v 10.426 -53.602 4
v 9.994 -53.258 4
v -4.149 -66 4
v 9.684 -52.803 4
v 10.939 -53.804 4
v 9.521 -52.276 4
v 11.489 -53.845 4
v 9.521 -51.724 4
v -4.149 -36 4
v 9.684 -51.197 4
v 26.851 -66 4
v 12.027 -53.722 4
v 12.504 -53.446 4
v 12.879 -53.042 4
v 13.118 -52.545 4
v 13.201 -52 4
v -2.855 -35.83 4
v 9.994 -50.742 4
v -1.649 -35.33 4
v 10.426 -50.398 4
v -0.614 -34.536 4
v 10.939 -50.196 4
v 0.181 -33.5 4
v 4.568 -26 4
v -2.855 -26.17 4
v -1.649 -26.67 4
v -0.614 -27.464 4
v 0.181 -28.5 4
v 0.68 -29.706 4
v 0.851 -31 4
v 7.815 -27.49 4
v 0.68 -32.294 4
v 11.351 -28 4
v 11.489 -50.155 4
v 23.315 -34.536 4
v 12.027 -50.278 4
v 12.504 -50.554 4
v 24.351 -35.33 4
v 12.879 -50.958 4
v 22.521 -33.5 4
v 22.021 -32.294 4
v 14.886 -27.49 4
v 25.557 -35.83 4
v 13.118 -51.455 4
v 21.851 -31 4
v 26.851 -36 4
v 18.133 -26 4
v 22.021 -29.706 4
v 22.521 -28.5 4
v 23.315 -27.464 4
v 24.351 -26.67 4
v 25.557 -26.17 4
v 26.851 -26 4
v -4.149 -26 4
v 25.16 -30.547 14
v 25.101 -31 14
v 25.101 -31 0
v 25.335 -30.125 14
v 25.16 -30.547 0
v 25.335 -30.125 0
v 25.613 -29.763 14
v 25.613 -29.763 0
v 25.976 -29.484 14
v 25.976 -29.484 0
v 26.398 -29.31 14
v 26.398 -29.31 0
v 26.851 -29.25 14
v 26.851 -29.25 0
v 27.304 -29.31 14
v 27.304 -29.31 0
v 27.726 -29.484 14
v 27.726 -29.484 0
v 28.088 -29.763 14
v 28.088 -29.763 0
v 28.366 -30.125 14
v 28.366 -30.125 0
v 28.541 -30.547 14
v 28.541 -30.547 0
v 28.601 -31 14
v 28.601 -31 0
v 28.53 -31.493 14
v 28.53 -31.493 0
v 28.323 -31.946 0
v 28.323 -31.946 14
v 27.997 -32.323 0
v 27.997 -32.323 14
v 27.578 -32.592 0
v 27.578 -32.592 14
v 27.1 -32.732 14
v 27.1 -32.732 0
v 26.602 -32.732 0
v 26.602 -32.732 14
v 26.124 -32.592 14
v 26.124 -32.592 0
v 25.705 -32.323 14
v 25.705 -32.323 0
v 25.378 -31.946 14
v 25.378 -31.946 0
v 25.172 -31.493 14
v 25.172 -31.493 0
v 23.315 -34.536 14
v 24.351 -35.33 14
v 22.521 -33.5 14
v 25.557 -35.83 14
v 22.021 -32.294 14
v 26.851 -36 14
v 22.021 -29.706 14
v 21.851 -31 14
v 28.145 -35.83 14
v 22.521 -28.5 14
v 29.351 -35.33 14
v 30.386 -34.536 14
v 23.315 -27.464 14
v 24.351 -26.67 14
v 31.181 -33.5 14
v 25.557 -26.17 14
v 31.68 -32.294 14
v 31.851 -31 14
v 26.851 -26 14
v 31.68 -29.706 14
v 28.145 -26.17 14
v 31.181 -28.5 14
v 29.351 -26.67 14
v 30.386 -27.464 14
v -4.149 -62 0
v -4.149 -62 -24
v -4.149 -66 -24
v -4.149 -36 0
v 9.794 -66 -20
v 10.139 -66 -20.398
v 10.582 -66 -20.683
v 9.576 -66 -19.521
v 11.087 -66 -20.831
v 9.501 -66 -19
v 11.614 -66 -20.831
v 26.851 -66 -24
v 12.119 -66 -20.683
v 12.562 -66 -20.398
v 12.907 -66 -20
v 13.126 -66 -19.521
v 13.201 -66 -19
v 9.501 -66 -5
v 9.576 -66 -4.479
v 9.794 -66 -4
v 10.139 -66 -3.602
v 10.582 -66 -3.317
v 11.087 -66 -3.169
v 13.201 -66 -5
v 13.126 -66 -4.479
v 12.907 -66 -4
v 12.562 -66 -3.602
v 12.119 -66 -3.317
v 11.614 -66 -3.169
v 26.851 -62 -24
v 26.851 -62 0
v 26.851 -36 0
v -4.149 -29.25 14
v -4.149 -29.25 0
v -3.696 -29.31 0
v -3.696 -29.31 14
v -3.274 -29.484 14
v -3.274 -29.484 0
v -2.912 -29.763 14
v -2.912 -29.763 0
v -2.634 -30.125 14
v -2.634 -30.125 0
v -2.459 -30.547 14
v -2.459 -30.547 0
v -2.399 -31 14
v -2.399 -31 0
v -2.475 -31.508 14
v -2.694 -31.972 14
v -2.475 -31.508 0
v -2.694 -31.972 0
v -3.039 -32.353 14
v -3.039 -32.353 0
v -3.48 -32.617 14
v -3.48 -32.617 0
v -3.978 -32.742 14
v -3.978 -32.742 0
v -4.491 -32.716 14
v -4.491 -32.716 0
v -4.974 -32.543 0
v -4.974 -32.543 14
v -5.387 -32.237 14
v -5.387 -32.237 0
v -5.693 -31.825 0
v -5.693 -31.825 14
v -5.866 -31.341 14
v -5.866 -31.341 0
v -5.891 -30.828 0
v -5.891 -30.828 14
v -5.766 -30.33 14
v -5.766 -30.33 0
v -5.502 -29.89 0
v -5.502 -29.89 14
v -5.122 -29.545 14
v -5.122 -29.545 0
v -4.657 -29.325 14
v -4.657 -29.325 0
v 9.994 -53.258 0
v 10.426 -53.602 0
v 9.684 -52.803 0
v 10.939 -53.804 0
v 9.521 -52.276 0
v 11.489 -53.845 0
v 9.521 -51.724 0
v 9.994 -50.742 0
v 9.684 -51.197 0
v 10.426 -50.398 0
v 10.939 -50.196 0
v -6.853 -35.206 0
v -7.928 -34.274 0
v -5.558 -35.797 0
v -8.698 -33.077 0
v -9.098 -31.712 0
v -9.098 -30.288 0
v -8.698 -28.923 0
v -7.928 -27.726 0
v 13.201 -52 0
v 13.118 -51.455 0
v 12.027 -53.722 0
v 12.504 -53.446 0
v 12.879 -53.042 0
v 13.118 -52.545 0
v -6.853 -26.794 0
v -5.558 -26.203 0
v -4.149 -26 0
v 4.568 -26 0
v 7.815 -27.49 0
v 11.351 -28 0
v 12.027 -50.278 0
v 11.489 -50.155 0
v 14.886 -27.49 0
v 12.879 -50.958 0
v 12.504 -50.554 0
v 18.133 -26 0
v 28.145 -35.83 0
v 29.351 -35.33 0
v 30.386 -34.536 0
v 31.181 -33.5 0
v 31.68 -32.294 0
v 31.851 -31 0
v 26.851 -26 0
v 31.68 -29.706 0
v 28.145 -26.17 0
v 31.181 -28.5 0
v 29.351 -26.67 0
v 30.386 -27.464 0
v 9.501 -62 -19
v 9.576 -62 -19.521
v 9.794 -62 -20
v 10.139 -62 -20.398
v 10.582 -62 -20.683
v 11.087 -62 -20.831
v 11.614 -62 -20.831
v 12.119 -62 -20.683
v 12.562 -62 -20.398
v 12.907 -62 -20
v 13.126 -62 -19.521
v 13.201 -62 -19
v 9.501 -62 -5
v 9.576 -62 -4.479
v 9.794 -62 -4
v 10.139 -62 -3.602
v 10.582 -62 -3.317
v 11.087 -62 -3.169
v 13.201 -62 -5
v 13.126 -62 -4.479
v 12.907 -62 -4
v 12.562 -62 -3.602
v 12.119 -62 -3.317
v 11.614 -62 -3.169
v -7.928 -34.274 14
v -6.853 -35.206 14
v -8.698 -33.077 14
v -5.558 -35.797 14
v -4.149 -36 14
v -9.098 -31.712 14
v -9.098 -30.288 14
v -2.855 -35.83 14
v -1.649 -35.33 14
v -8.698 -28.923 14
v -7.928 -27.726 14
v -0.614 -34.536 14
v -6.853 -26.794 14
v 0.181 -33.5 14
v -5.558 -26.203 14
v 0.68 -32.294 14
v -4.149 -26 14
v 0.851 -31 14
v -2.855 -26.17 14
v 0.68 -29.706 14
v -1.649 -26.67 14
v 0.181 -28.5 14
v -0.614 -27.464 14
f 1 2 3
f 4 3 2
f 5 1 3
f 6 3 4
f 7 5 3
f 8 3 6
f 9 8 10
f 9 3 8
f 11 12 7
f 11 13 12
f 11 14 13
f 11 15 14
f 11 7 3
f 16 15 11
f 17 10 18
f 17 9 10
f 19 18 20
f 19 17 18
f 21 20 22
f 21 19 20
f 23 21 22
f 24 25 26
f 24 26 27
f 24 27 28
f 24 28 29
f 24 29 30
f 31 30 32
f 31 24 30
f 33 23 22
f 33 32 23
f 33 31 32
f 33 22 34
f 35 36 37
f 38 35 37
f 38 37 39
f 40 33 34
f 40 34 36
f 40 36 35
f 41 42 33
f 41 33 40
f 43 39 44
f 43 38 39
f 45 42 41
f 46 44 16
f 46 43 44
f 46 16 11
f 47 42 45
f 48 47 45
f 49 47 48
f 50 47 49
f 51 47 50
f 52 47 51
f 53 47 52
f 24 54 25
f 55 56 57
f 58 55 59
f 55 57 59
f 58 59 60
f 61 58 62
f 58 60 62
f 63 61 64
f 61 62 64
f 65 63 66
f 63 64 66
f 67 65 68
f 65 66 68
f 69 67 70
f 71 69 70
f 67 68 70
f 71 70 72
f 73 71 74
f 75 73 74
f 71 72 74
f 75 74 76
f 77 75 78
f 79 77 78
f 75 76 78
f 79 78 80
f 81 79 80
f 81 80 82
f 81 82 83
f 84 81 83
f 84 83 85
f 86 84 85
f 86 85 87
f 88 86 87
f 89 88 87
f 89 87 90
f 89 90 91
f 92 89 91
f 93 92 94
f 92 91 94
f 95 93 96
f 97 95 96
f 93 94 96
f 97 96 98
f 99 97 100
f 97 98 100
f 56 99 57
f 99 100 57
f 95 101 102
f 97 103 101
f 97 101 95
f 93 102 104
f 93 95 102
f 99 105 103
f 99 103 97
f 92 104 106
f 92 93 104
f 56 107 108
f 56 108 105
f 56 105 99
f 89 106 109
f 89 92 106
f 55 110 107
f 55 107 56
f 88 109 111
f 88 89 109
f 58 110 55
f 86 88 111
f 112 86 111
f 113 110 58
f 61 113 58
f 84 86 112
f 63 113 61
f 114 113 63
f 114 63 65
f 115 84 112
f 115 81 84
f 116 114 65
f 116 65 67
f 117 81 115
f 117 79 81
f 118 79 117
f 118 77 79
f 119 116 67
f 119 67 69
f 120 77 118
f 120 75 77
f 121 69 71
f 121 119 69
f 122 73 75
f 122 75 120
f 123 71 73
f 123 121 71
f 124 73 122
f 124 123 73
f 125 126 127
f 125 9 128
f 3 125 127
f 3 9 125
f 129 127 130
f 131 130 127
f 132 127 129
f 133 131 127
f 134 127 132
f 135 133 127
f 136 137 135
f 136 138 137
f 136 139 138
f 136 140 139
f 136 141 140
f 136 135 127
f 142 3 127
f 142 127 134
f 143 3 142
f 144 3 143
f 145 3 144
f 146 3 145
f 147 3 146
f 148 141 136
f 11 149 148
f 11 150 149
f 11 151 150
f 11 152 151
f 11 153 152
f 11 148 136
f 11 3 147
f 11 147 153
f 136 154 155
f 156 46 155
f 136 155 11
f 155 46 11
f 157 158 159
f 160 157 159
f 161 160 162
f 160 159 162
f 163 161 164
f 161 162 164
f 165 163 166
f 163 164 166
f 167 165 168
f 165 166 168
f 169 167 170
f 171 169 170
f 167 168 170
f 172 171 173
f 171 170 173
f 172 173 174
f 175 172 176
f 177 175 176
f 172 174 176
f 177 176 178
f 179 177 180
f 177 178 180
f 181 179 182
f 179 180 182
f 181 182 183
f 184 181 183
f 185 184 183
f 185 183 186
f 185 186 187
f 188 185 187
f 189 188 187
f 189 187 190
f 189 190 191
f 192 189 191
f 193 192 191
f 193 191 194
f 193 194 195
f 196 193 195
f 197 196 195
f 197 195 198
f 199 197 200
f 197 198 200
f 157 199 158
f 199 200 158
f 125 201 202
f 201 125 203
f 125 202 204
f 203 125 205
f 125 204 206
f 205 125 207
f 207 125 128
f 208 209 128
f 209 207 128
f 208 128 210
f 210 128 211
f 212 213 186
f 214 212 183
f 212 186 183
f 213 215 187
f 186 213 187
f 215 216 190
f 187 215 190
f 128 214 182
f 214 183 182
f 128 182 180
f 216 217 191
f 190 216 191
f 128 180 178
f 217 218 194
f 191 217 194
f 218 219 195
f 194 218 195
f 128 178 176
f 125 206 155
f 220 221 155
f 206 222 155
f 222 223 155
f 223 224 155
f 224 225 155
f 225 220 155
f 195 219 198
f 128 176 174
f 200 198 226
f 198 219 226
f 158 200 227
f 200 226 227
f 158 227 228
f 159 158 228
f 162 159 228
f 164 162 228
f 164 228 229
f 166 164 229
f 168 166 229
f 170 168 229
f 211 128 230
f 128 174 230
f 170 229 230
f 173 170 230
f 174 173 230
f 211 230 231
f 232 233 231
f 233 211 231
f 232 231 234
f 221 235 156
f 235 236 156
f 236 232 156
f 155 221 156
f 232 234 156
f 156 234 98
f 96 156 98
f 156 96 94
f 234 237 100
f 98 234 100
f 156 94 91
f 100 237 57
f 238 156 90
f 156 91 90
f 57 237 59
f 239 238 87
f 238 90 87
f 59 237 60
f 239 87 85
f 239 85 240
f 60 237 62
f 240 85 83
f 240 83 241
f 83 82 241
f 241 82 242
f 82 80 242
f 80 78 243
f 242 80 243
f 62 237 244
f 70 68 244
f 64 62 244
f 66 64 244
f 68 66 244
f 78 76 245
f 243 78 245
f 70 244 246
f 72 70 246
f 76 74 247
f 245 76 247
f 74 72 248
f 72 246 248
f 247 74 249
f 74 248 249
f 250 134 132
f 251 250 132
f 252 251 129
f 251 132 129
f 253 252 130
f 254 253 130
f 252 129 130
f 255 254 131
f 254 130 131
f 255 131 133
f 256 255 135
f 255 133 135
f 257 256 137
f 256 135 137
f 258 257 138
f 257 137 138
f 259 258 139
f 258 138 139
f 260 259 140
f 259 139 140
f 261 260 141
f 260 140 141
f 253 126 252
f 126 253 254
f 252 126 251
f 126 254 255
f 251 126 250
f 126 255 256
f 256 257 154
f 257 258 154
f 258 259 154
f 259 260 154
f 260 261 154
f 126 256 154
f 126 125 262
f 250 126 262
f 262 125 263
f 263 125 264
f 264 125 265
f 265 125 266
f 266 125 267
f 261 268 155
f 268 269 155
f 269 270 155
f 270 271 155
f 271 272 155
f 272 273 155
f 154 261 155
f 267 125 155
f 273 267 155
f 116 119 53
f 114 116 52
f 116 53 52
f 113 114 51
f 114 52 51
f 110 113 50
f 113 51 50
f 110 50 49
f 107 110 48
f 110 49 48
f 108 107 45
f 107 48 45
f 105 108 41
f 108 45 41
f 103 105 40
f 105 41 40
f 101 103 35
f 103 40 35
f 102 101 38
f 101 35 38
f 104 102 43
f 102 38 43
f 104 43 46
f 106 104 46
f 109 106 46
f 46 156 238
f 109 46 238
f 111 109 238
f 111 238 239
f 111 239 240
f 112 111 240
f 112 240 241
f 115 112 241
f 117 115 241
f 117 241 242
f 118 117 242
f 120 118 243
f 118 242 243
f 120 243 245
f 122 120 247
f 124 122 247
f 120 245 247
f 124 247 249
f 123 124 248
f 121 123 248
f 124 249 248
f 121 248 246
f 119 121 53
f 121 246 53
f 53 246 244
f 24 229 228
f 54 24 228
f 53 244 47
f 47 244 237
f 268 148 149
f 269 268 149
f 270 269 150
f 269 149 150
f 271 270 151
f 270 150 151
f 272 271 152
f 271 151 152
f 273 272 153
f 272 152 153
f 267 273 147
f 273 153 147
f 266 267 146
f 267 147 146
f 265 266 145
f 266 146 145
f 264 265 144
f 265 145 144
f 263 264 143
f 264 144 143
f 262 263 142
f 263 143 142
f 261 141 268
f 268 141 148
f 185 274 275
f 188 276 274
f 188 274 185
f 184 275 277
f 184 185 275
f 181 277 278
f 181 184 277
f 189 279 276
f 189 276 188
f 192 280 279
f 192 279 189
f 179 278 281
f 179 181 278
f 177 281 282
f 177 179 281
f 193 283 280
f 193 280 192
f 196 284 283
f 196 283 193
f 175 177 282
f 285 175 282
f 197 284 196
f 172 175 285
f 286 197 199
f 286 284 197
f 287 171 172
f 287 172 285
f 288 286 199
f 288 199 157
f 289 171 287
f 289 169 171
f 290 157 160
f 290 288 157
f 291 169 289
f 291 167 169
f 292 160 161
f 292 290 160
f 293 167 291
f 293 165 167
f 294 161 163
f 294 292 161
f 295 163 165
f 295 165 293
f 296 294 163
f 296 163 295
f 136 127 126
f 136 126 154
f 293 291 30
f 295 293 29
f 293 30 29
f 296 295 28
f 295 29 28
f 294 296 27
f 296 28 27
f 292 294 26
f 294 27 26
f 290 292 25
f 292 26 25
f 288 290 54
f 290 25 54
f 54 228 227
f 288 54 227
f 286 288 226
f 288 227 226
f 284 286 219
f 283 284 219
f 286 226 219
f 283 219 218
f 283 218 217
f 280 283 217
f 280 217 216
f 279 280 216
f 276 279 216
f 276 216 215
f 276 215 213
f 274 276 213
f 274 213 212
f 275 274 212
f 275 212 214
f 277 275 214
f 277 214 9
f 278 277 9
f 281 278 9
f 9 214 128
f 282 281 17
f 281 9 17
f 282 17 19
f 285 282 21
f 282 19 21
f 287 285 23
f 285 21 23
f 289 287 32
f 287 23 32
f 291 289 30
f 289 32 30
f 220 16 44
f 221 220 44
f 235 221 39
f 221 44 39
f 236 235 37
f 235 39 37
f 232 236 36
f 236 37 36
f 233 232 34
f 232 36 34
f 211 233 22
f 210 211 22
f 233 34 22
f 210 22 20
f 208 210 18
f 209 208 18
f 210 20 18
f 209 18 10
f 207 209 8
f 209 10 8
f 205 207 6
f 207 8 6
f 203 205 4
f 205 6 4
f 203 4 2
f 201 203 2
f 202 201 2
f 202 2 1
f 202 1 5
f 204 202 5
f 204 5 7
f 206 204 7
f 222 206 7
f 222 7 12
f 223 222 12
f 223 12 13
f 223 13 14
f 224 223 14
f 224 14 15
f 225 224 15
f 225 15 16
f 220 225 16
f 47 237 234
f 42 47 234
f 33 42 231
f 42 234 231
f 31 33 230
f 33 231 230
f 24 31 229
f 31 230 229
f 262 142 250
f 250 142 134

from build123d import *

# Parameters (mm, degrees)
F1_DEPTH = 4
F2_DEPTH = 14
F3_DEPTH = 30
F4_W     = 31
F4_H     = 4
F5_DEPTH = 24
F8_DEPTH = 25
F7_R     = 1.85
F9_DEPTH = 25


with BuildPart() as f1:
    # F0 (on Top) → F1 (new body)
    with BuildSketch(Plane.XY):
        with BuildLine():
            ThreePointArc((-4.1493639073, -29.25), (-2.9119270402, -29.7625631329), (-2.3993639073, -31))
            Line((-2.3993639073, -31), (0.8506360927, -31))
            ThreePointArc((0.8506360927, -31), (-0.6138300013, -27.4644660941), (-4.1493639073, -26))
            Line((-4.1493639073, -26), (-4.1493639073, -29.25))
        make_face()
        with BuildLine():
            Line((0.8506360927, -31), (-2.3993639073, -31))
            ThreePointArc((-2.3993639073, -31), (-5.3868007743, -32.2374368671), (-4.1493639073, -29.25))
            Line((-4.1493639073, -29.25), (-4.1493639073, -26))
            ThreePointArc((-4.1493639073, -26), (-9.1493639073, -31), (-4.1493639073, -36))
            ThreePointArc((-4.1493639073, -36), (-0.6138300013, -34.5355339059), (0.8506360927, -31))
        make_face()
        with BuildLine():
            ThreePointArc((-4.1493639073, -26), (-0.6138300013, -27.4644660941), (0.8506360927, -31))
            Line((0.8506360927, -31), (21.8506360927, -31))
            ThreePointArc((21.8506360927, -31), (23.3151021868, -27.4644660941), (26.8506360927, -26))
            Line((26.8506360927, -26), (18.1329660759, -26))
            ThreePointArc((18.1329660759, -26), (11.3506360927, -28), (4.5683061096, -26))
            Line((4.5683061096, -26), (-4.1493639073, -26))
        make_face()
        with BuildLine():
            ThreePointArc((26.8506360927, -26), (23.3151021868, -27.4644660941), (21.8506360927, -31))
            Line((21.8506360927, -31), (25.1006360927, -31))
            ThreePointArc((25.1006360927, -31), (25.6131992257, -29.7625631329), (26.8506360927, -29.25))
            Line((26.8506360927, -29.25), (26.8506360927, -26))
        make_face()
        with BuildLine():
            Line((25.1006360927, -31), (21.8506360927, -31))
            ThreePointArc((21.8506360927, -31), (23.3151021868, -34.5355339059), (26.8506360927, -36))
            ThreePointArc((26.8506360927, -36), (30.3861699987, -34.5355339059), (31.8506360927, -31))
            ThreePointArc((31.8506360927, -31), (30.3861699987, -27.4644660941), (26.8506360927, -26))
            Line((26.8506360927, -26), (26.8506360927, -29.25))
            ThreePointArc((26.8506360927, -29.25), (28.0880729598, -29.7625631329), (28.6006360927, -31))
            ThreePointArc((28.6006360927, -31), (26.8506360927, -32.75), (25.1006360927, -31))
        make_face()
        with BuildLine():
            Line((21.8506360927, -31), (0.8506360927, -31))
            ThreePointArc((0.8506360927, -31), (-0.6138300013, -34.5355339059), (-4.1493639073, -36))
            Line((-4.1493639073, -36), (26.8506360927, -36))
            ThreePointArc((26.8506360927, -36), (23.3151021868, -34.5355339059), (21.8506360927, -31))
        make_face()
    extrude(amount=F1_DEPTH)

    # F0 (on Top) → F2 (join)
    with BuildSketch(Plane.XY):
        with BuildLine():
            ThreePointArc((-4.1493639073, -29.25), (-2.9119270402, -29.7625631329), (-2.3993639073, -31))
            Line((-2.3993639073, -31), (0.8506360927, -31))
            ThreePointArc((0.8506360927, -31), (-0.6138300013, -27.4644660941), (-4.1493639073, -26))
            Line((-4.1493639073, -26), (-4.1493639073, -29.25))
        make_face()
        with BuildLine():
            Line((0.8506360927, -31), (-2.3993639073, -31))
            ThreePointArc((-2.3993639073, -31), (-5.3868007743, -32.2374368671), (-4.1493639073, -29.25))
            Line((-4.1493639073, -29.25), (-4.1493639073, -26))
            ThreePointArc((-4.1493639073, -26), (-9.1493639073, -31), (-4.1493639073, -36))
            ThreePointArc((-4.1493639073, -36), (-0.6138300013, -34.5355339059), (0.8506360927, -31))
        make_face()
        with BuildLine():
            ThreePointArc((26.8506360927, -26), (23.3151021868, -27.4644660941), (21.8506360927, -31))
            Line((21.8506360927, -31), (25.1006360927, -31))
            ThreePointArc((25.1006360927, -31), (25.6131992257, -29.7625631329), (26.8506360927, -29.25))
            Line((26.8506360927, -29.25), (26.8506360927, -26))
        make_face()
        with BuildLine():
            Line((25.1006360927, -31), (21.8506360927, -31))
            ThreePointArc((21.8506360927, -31), (23.3151021868, -34.5355339059), (26.8506360927, -36))
            ThreePointArc((26.8506360927, -36), (30.3861699987, -34.5355339059), (31.8506360927, -31))
            ThreePointArc((31.8506360927, -31), (30.3861699987, -27.4644660941), (26.8506360927, -26))
            Line((26.8506360927, -26), (26.8506360927, -29.25))
            ThreePointArc((26.8506360927, -29.25), (28.0880729598, -29.7625631329), (28.6006360927, -31))
            ThreePointArc((28.6006360927, -31), (26.8506360927, -32.75), (25.1006360927, -31))
        make_face()
    extrude(amount=F2_DEPTH)

    # F3 (add): a face of the model
    f3_faces = [f1.faces().sort_by_distance(p)[0] for p in [
        (11.3506360927, -36, 2),
    ]]
    extrude(f3_faces, amount=F3_DEPTH)

    # F4 (on face) → F5 (join)
    with BuildSketch(Plane(origin=(0, 0, 0), x_dir=(1, 0, 0), z_dir=(0, 0, -1))):
        with Locations((11.3506360927, 64)):
            Rectangle(F4_W, F4_H)
    extrude(amount=F5_DEPTH)

    # F6 (on face) → F8 (cut)
    with BuildSketch(Plane.XZ.offset(66)):
        with BuildLine():
            Line((13.2006360927, -19), (13.2006360927, -12))
            Line((13.2006360927, -12), (13.2006360927, -5))
            ThreePointArc((13.2006360927, -5), (11.3506360927, -3.15), (9.5006360927, -5))
            Line((9.5006360927, -5), (9.5006360927, -12))
            Line((9.5006360927, -12), (9.5006360927, -19))
            ThreePointArc((9.5006360927, -19), (11.3506360927, -20.85), (13.2006360927, -19))
        make_face()
    extrude(amount=-F8_DEPTH, mode=Mode.SUBTRACT)

    # F7 (on face) → F9 (cut)
    with BuildSketch(Plane.XY.offset(4)):
        with Locations((11.3506360927, -52)):
            Circle(F7_R)
    extrude(amount=-F9_DEPTH, mode=Mode.SUBTRACT)


solid = f1.part
